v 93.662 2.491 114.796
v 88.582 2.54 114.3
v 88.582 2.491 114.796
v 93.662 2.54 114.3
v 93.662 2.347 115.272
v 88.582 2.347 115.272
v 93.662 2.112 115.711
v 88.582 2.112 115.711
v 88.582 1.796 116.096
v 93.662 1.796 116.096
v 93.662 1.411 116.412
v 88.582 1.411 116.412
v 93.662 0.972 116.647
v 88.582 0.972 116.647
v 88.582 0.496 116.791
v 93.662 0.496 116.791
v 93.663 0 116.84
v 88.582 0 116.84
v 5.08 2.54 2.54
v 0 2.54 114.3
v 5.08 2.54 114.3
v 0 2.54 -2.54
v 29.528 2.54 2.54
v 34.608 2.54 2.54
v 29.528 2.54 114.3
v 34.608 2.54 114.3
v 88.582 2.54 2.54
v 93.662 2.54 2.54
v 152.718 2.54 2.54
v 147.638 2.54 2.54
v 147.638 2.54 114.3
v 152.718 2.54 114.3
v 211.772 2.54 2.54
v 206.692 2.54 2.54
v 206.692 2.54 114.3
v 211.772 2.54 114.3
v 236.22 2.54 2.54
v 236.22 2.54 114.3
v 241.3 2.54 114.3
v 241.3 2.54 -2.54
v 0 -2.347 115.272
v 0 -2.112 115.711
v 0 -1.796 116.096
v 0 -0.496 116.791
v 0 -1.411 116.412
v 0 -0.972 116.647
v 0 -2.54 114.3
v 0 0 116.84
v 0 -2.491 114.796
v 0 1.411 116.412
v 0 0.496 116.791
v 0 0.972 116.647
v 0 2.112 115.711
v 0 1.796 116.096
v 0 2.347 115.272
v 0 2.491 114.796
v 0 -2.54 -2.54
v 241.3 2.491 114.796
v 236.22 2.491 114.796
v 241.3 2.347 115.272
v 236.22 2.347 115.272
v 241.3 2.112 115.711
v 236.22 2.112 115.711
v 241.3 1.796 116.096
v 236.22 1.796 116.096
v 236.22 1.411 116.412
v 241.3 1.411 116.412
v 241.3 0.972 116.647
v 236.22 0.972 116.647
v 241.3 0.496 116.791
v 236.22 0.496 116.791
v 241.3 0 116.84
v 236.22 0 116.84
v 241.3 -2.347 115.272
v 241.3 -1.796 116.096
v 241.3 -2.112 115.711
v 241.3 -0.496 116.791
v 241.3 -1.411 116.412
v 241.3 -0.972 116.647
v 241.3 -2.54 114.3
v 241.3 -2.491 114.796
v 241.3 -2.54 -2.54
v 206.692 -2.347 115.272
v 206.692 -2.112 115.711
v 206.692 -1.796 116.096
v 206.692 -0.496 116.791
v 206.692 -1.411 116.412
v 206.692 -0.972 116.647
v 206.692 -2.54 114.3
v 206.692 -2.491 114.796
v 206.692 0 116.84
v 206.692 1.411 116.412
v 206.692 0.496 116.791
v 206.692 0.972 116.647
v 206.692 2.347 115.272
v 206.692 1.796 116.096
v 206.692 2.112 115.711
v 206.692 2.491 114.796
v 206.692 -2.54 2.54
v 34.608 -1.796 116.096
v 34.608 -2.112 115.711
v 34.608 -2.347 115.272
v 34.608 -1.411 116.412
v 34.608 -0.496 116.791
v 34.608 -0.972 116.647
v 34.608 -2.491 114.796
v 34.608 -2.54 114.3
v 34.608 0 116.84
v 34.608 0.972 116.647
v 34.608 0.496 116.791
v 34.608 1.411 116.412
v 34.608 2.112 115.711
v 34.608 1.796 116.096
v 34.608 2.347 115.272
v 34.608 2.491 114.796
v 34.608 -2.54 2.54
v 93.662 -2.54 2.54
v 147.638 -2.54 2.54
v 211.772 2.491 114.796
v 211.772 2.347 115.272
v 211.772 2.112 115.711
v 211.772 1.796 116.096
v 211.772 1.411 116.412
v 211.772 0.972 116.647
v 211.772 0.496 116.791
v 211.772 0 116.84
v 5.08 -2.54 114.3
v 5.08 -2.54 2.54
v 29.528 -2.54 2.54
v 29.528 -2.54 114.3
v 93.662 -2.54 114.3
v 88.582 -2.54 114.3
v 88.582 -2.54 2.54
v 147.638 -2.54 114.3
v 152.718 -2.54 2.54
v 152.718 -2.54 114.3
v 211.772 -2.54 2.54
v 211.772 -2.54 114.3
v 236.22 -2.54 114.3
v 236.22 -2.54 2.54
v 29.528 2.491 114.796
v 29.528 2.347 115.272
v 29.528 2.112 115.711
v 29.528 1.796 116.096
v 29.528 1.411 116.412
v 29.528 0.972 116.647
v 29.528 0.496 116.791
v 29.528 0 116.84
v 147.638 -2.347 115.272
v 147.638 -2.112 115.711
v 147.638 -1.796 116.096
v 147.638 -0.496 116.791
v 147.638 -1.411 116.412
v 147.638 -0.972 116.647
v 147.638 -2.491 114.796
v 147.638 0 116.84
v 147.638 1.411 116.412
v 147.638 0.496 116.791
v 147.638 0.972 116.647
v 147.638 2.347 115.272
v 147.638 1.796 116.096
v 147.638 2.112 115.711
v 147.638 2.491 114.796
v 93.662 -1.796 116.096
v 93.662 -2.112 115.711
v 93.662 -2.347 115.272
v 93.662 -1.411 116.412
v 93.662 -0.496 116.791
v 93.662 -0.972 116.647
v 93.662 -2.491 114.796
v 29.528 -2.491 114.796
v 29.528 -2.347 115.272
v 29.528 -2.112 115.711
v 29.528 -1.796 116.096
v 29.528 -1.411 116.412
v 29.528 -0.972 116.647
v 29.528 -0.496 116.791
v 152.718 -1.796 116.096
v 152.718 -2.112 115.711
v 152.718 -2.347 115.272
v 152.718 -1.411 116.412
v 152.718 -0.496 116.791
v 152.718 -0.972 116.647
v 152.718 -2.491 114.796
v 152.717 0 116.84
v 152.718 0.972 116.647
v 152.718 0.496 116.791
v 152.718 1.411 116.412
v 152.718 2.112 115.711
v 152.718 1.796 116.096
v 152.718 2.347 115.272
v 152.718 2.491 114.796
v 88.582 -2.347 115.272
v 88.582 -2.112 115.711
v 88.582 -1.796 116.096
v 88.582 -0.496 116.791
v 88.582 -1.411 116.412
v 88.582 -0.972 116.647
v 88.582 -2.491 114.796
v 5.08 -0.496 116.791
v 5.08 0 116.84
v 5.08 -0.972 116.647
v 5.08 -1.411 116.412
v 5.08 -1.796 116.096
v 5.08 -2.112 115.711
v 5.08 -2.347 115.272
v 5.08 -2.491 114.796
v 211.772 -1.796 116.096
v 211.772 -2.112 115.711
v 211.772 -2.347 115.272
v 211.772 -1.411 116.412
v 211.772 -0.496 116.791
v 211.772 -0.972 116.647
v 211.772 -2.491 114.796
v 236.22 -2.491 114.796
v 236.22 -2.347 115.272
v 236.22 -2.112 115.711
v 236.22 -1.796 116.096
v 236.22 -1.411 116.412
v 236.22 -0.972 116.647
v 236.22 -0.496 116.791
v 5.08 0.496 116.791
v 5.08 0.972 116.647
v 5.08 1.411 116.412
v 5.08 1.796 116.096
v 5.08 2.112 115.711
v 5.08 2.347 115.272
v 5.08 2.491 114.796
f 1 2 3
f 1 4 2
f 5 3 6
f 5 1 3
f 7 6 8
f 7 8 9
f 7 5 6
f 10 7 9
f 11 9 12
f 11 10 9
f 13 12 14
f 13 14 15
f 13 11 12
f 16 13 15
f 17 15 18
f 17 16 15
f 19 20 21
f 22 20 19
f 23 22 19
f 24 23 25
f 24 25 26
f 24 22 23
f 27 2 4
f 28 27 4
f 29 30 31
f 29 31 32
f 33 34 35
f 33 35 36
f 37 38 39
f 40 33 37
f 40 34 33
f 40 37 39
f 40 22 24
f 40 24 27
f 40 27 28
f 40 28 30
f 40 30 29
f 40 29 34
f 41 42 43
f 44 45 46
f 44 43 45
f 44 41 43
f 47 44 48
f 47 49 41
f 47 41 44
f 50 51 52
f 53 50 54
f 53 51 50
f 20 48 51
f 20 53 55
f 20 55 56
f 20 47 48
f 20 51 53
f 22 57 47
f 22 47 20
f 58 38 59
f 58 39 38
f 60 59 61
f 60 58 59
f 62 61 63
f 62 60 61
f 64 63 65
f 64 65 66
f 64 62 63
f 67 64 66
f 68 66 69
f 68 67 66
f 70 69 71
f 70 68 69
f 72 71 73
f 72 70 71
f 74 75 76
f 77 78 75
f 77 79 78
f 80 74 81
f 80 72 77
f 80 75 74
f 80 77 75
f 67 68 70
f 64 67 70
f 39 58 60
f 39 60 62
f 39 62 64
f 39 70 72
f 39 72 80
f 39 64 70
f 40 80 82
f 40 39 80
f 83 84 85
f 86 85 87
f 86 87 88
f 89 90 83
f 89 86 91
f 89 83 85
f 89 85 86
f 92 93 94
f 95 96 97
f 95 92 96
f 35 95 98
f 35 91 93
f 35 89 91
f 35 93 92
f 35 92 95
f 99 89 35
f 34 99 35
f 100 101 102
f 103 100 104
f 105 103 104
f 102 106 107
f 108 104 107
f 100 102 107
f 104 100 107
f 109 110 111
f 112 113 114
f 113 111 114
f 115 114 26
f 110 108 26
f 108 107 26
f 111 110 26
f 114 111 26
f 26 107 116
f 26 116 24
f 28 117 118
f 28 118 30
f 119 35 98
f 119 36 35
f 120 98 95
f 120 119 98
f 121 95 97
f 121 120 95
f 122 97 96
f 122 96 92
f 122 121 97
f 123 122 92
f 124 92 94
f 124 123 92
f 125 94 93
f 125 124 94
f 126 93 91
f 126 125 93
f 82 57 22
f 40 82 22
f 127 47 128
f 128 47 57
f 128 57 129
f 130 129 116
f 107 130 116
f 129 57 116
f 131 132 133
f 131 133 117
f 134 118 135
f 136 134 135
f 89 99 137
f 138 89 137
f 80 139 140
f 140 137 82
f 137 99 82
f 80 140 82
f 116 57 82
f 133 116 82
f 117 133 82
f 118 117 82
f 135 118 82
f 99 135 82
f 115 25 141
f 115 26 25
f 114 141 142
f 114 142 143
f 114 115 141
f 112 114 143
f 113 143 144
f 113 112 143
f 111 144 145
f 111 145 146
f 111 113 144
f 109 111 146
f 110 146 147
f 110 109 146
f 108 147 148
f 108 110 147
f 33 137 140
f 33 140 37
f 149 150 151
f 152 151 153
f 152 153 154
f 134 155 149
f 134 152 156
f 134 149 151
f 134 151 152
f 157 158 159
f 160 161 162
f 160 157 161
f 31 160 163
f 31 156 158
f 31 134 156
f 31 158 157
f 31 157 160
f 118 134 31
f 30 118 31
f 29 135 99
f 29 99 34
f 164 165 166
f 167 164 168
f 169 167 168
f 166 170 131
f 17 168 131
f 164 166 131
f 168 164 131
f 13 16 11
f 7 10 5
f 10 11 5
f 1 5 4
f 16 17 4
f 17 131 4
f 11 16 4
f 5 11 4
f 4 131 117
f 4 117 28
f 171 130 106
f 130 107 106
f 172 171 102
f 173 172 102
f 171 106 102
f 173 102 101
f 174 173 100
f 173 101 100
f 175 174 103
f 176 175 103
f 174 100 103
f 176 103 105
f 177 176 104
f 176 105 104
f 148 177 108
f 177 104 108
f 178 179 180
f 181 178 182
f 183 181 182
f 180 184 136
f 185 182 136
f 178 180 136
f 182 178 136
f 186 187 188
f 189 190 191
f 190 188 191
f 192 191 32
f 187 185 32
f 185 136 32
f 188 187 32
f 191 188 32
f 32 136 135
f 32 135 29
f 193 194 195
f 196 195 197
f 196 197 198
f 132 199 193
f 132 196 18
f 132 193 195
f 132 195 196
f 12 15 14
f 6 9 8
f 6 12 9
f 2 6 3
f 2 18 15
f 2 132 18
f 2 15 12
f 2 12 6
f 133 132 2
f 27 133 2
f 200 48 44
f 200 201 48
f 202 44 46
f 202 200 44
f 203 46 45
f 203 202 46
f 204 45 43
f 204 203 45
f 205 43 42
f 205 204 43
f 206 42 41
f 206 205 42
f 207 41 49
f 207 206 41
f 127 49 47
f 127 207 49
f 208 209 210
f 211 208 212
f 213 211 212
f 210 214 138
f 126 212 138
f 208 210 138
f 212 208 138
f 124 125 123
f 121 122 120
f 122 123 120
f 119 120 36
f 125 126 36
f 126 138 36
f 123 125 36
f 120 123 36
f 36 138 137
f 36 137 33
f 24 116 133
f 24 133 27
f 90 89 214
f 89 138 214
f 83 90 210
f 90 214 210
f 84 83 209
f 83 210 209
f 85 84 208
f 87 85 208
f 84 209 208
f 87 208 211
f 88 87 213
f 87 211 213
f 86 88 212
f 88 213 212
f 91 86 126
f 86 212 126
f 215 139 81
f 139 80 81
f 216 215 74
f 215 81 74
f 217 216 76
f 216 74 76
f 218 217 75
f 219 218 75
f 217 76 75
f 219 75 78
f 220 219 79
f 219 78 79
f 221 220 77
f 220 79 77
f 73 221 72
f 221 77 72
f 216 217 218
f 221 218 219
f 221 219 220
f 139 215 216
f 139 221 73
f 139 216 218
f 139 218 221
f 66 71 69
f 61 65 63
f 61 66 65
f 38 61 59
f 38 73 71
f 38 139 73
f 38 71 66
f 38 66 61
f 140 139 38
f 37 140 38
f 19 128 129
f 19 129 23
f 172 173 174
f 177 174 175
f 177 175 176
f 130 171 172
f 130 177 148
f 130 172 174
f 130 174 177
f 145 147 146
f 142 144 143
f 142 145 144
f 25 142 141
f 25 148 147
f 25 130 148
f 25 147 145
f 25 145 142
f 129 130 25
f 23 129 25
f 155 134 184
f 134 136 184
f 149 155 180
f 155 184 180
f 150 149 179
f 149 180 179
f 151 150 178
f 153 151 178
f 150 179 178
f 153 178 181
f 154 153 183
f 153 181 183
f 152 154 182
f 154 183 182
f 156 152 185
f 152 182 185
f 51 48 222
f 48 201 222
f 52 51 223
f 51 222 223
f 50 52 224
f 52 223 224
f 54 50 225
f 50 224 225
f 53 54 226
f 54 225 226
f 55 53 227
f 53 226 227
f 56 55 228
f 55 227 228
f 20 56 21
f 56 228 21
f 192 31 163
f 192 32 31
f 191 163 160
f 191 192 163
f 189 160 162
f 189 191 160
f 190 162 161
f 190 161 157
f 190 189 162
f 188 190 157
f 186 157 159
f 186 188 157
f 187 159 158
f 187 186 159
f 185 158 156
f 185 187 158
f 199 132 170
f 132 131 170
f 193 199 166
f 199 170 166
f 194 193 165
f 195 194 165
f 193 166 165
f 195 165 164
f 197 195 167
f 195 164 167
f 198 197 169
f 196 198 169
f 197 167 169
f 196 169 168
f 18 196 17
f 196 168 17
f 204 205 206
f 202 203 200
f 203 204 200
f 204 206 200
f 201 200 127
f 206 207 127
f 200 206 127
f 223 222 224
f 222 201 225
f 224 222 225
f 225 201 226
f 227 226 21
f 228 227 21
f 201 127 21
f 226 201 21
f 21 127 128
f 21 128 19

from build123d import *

# Parameters (mm, degrees)
SKETCH1_W              = 5.08
SKETCH1_H              = 5.08
BOSS_EXTRUDE1_DEPTH    = 241.3
SKETCH2_W              = 5.08
SKETCH2_H              = 5.08
BOSS_EXTRUDE2_DEPTH    = 116.84
FILLET1_R              = 2.54
LPATTERN1_COUNT        = 9
LPATTERN1_PITCH        = 29.5275
FILLET1_OF_LPATTERN1_R = 2.54


with BuildPart() as part:
    # Sketch1 → Boss-Extrude1 (new body)
    with BuildSketch(Plane(origin=(0, 0, 0), x_dir=(0, 0, -1), z_dir=(1, 0, 0))):
        Rectangle(SKETCH1_W, SKETCH1_H)
    extrude(amount=BOSS_EXTRUDE1_DEPTH)

    # Sketch2 → Boss-Extrude2 (add)
    with BuildSketch(Plane.XY):
        with Locations((2.54, 0)):
            Rectangle(SKETCH2_W, SKETCH2_H)
    boss_extrude2 = extrude(amount=BOSS_EXTRUDE2_DEPTH)

    # Fillet1
    fillet1_edges = [part.edges().sort_by_distance(p)[0] for p in [
        (2.54, -2.54, 116.84),
        (2.54, 2.54, 116.84),
    ]]
    fillet(fillet1_edges, radius=FILLET1_R - 0.0001)  # a hair under: the kernel refuses the full size

    # LPattern1: Boss-Extrude2 ×9, 3 skipped
    with Locations(*[(i * LPATTERN1_PITCH, 0, 0) for i in range(1, LPATTERN1_COUNT) if i not in (2, 4, 6)]):
        add(boss_extrude2)

    # Fillet1 of LPattern1
    fillet1_of_lpattern1_edges = [part.edges().sort_by_distance(p)[0] for p in [
        (32.0675, -2.54, 116.84),
        (32.0675, 2.54, 116.84),
        (91.1225, -2.54, 116.84),
        (91.1225, 2.54, 116.84),
        (150.1775, -2.54, 116.84),
        (150.1775, 2.54, 116.84),
        (209.2325, -2.54, 116.84),
        (209.2325, 2.54, 116.84),
        (238.76, -2.54, 116.84),
        (238.76, 2.54, 116.84),
    ]]
    fillet(fillet1_of_lpattern1_edges, radius=FILLET1_OF_LPATTERN1_R - 0.0001)  # a hair under: the kernel refuses the full size


solid = part.part
